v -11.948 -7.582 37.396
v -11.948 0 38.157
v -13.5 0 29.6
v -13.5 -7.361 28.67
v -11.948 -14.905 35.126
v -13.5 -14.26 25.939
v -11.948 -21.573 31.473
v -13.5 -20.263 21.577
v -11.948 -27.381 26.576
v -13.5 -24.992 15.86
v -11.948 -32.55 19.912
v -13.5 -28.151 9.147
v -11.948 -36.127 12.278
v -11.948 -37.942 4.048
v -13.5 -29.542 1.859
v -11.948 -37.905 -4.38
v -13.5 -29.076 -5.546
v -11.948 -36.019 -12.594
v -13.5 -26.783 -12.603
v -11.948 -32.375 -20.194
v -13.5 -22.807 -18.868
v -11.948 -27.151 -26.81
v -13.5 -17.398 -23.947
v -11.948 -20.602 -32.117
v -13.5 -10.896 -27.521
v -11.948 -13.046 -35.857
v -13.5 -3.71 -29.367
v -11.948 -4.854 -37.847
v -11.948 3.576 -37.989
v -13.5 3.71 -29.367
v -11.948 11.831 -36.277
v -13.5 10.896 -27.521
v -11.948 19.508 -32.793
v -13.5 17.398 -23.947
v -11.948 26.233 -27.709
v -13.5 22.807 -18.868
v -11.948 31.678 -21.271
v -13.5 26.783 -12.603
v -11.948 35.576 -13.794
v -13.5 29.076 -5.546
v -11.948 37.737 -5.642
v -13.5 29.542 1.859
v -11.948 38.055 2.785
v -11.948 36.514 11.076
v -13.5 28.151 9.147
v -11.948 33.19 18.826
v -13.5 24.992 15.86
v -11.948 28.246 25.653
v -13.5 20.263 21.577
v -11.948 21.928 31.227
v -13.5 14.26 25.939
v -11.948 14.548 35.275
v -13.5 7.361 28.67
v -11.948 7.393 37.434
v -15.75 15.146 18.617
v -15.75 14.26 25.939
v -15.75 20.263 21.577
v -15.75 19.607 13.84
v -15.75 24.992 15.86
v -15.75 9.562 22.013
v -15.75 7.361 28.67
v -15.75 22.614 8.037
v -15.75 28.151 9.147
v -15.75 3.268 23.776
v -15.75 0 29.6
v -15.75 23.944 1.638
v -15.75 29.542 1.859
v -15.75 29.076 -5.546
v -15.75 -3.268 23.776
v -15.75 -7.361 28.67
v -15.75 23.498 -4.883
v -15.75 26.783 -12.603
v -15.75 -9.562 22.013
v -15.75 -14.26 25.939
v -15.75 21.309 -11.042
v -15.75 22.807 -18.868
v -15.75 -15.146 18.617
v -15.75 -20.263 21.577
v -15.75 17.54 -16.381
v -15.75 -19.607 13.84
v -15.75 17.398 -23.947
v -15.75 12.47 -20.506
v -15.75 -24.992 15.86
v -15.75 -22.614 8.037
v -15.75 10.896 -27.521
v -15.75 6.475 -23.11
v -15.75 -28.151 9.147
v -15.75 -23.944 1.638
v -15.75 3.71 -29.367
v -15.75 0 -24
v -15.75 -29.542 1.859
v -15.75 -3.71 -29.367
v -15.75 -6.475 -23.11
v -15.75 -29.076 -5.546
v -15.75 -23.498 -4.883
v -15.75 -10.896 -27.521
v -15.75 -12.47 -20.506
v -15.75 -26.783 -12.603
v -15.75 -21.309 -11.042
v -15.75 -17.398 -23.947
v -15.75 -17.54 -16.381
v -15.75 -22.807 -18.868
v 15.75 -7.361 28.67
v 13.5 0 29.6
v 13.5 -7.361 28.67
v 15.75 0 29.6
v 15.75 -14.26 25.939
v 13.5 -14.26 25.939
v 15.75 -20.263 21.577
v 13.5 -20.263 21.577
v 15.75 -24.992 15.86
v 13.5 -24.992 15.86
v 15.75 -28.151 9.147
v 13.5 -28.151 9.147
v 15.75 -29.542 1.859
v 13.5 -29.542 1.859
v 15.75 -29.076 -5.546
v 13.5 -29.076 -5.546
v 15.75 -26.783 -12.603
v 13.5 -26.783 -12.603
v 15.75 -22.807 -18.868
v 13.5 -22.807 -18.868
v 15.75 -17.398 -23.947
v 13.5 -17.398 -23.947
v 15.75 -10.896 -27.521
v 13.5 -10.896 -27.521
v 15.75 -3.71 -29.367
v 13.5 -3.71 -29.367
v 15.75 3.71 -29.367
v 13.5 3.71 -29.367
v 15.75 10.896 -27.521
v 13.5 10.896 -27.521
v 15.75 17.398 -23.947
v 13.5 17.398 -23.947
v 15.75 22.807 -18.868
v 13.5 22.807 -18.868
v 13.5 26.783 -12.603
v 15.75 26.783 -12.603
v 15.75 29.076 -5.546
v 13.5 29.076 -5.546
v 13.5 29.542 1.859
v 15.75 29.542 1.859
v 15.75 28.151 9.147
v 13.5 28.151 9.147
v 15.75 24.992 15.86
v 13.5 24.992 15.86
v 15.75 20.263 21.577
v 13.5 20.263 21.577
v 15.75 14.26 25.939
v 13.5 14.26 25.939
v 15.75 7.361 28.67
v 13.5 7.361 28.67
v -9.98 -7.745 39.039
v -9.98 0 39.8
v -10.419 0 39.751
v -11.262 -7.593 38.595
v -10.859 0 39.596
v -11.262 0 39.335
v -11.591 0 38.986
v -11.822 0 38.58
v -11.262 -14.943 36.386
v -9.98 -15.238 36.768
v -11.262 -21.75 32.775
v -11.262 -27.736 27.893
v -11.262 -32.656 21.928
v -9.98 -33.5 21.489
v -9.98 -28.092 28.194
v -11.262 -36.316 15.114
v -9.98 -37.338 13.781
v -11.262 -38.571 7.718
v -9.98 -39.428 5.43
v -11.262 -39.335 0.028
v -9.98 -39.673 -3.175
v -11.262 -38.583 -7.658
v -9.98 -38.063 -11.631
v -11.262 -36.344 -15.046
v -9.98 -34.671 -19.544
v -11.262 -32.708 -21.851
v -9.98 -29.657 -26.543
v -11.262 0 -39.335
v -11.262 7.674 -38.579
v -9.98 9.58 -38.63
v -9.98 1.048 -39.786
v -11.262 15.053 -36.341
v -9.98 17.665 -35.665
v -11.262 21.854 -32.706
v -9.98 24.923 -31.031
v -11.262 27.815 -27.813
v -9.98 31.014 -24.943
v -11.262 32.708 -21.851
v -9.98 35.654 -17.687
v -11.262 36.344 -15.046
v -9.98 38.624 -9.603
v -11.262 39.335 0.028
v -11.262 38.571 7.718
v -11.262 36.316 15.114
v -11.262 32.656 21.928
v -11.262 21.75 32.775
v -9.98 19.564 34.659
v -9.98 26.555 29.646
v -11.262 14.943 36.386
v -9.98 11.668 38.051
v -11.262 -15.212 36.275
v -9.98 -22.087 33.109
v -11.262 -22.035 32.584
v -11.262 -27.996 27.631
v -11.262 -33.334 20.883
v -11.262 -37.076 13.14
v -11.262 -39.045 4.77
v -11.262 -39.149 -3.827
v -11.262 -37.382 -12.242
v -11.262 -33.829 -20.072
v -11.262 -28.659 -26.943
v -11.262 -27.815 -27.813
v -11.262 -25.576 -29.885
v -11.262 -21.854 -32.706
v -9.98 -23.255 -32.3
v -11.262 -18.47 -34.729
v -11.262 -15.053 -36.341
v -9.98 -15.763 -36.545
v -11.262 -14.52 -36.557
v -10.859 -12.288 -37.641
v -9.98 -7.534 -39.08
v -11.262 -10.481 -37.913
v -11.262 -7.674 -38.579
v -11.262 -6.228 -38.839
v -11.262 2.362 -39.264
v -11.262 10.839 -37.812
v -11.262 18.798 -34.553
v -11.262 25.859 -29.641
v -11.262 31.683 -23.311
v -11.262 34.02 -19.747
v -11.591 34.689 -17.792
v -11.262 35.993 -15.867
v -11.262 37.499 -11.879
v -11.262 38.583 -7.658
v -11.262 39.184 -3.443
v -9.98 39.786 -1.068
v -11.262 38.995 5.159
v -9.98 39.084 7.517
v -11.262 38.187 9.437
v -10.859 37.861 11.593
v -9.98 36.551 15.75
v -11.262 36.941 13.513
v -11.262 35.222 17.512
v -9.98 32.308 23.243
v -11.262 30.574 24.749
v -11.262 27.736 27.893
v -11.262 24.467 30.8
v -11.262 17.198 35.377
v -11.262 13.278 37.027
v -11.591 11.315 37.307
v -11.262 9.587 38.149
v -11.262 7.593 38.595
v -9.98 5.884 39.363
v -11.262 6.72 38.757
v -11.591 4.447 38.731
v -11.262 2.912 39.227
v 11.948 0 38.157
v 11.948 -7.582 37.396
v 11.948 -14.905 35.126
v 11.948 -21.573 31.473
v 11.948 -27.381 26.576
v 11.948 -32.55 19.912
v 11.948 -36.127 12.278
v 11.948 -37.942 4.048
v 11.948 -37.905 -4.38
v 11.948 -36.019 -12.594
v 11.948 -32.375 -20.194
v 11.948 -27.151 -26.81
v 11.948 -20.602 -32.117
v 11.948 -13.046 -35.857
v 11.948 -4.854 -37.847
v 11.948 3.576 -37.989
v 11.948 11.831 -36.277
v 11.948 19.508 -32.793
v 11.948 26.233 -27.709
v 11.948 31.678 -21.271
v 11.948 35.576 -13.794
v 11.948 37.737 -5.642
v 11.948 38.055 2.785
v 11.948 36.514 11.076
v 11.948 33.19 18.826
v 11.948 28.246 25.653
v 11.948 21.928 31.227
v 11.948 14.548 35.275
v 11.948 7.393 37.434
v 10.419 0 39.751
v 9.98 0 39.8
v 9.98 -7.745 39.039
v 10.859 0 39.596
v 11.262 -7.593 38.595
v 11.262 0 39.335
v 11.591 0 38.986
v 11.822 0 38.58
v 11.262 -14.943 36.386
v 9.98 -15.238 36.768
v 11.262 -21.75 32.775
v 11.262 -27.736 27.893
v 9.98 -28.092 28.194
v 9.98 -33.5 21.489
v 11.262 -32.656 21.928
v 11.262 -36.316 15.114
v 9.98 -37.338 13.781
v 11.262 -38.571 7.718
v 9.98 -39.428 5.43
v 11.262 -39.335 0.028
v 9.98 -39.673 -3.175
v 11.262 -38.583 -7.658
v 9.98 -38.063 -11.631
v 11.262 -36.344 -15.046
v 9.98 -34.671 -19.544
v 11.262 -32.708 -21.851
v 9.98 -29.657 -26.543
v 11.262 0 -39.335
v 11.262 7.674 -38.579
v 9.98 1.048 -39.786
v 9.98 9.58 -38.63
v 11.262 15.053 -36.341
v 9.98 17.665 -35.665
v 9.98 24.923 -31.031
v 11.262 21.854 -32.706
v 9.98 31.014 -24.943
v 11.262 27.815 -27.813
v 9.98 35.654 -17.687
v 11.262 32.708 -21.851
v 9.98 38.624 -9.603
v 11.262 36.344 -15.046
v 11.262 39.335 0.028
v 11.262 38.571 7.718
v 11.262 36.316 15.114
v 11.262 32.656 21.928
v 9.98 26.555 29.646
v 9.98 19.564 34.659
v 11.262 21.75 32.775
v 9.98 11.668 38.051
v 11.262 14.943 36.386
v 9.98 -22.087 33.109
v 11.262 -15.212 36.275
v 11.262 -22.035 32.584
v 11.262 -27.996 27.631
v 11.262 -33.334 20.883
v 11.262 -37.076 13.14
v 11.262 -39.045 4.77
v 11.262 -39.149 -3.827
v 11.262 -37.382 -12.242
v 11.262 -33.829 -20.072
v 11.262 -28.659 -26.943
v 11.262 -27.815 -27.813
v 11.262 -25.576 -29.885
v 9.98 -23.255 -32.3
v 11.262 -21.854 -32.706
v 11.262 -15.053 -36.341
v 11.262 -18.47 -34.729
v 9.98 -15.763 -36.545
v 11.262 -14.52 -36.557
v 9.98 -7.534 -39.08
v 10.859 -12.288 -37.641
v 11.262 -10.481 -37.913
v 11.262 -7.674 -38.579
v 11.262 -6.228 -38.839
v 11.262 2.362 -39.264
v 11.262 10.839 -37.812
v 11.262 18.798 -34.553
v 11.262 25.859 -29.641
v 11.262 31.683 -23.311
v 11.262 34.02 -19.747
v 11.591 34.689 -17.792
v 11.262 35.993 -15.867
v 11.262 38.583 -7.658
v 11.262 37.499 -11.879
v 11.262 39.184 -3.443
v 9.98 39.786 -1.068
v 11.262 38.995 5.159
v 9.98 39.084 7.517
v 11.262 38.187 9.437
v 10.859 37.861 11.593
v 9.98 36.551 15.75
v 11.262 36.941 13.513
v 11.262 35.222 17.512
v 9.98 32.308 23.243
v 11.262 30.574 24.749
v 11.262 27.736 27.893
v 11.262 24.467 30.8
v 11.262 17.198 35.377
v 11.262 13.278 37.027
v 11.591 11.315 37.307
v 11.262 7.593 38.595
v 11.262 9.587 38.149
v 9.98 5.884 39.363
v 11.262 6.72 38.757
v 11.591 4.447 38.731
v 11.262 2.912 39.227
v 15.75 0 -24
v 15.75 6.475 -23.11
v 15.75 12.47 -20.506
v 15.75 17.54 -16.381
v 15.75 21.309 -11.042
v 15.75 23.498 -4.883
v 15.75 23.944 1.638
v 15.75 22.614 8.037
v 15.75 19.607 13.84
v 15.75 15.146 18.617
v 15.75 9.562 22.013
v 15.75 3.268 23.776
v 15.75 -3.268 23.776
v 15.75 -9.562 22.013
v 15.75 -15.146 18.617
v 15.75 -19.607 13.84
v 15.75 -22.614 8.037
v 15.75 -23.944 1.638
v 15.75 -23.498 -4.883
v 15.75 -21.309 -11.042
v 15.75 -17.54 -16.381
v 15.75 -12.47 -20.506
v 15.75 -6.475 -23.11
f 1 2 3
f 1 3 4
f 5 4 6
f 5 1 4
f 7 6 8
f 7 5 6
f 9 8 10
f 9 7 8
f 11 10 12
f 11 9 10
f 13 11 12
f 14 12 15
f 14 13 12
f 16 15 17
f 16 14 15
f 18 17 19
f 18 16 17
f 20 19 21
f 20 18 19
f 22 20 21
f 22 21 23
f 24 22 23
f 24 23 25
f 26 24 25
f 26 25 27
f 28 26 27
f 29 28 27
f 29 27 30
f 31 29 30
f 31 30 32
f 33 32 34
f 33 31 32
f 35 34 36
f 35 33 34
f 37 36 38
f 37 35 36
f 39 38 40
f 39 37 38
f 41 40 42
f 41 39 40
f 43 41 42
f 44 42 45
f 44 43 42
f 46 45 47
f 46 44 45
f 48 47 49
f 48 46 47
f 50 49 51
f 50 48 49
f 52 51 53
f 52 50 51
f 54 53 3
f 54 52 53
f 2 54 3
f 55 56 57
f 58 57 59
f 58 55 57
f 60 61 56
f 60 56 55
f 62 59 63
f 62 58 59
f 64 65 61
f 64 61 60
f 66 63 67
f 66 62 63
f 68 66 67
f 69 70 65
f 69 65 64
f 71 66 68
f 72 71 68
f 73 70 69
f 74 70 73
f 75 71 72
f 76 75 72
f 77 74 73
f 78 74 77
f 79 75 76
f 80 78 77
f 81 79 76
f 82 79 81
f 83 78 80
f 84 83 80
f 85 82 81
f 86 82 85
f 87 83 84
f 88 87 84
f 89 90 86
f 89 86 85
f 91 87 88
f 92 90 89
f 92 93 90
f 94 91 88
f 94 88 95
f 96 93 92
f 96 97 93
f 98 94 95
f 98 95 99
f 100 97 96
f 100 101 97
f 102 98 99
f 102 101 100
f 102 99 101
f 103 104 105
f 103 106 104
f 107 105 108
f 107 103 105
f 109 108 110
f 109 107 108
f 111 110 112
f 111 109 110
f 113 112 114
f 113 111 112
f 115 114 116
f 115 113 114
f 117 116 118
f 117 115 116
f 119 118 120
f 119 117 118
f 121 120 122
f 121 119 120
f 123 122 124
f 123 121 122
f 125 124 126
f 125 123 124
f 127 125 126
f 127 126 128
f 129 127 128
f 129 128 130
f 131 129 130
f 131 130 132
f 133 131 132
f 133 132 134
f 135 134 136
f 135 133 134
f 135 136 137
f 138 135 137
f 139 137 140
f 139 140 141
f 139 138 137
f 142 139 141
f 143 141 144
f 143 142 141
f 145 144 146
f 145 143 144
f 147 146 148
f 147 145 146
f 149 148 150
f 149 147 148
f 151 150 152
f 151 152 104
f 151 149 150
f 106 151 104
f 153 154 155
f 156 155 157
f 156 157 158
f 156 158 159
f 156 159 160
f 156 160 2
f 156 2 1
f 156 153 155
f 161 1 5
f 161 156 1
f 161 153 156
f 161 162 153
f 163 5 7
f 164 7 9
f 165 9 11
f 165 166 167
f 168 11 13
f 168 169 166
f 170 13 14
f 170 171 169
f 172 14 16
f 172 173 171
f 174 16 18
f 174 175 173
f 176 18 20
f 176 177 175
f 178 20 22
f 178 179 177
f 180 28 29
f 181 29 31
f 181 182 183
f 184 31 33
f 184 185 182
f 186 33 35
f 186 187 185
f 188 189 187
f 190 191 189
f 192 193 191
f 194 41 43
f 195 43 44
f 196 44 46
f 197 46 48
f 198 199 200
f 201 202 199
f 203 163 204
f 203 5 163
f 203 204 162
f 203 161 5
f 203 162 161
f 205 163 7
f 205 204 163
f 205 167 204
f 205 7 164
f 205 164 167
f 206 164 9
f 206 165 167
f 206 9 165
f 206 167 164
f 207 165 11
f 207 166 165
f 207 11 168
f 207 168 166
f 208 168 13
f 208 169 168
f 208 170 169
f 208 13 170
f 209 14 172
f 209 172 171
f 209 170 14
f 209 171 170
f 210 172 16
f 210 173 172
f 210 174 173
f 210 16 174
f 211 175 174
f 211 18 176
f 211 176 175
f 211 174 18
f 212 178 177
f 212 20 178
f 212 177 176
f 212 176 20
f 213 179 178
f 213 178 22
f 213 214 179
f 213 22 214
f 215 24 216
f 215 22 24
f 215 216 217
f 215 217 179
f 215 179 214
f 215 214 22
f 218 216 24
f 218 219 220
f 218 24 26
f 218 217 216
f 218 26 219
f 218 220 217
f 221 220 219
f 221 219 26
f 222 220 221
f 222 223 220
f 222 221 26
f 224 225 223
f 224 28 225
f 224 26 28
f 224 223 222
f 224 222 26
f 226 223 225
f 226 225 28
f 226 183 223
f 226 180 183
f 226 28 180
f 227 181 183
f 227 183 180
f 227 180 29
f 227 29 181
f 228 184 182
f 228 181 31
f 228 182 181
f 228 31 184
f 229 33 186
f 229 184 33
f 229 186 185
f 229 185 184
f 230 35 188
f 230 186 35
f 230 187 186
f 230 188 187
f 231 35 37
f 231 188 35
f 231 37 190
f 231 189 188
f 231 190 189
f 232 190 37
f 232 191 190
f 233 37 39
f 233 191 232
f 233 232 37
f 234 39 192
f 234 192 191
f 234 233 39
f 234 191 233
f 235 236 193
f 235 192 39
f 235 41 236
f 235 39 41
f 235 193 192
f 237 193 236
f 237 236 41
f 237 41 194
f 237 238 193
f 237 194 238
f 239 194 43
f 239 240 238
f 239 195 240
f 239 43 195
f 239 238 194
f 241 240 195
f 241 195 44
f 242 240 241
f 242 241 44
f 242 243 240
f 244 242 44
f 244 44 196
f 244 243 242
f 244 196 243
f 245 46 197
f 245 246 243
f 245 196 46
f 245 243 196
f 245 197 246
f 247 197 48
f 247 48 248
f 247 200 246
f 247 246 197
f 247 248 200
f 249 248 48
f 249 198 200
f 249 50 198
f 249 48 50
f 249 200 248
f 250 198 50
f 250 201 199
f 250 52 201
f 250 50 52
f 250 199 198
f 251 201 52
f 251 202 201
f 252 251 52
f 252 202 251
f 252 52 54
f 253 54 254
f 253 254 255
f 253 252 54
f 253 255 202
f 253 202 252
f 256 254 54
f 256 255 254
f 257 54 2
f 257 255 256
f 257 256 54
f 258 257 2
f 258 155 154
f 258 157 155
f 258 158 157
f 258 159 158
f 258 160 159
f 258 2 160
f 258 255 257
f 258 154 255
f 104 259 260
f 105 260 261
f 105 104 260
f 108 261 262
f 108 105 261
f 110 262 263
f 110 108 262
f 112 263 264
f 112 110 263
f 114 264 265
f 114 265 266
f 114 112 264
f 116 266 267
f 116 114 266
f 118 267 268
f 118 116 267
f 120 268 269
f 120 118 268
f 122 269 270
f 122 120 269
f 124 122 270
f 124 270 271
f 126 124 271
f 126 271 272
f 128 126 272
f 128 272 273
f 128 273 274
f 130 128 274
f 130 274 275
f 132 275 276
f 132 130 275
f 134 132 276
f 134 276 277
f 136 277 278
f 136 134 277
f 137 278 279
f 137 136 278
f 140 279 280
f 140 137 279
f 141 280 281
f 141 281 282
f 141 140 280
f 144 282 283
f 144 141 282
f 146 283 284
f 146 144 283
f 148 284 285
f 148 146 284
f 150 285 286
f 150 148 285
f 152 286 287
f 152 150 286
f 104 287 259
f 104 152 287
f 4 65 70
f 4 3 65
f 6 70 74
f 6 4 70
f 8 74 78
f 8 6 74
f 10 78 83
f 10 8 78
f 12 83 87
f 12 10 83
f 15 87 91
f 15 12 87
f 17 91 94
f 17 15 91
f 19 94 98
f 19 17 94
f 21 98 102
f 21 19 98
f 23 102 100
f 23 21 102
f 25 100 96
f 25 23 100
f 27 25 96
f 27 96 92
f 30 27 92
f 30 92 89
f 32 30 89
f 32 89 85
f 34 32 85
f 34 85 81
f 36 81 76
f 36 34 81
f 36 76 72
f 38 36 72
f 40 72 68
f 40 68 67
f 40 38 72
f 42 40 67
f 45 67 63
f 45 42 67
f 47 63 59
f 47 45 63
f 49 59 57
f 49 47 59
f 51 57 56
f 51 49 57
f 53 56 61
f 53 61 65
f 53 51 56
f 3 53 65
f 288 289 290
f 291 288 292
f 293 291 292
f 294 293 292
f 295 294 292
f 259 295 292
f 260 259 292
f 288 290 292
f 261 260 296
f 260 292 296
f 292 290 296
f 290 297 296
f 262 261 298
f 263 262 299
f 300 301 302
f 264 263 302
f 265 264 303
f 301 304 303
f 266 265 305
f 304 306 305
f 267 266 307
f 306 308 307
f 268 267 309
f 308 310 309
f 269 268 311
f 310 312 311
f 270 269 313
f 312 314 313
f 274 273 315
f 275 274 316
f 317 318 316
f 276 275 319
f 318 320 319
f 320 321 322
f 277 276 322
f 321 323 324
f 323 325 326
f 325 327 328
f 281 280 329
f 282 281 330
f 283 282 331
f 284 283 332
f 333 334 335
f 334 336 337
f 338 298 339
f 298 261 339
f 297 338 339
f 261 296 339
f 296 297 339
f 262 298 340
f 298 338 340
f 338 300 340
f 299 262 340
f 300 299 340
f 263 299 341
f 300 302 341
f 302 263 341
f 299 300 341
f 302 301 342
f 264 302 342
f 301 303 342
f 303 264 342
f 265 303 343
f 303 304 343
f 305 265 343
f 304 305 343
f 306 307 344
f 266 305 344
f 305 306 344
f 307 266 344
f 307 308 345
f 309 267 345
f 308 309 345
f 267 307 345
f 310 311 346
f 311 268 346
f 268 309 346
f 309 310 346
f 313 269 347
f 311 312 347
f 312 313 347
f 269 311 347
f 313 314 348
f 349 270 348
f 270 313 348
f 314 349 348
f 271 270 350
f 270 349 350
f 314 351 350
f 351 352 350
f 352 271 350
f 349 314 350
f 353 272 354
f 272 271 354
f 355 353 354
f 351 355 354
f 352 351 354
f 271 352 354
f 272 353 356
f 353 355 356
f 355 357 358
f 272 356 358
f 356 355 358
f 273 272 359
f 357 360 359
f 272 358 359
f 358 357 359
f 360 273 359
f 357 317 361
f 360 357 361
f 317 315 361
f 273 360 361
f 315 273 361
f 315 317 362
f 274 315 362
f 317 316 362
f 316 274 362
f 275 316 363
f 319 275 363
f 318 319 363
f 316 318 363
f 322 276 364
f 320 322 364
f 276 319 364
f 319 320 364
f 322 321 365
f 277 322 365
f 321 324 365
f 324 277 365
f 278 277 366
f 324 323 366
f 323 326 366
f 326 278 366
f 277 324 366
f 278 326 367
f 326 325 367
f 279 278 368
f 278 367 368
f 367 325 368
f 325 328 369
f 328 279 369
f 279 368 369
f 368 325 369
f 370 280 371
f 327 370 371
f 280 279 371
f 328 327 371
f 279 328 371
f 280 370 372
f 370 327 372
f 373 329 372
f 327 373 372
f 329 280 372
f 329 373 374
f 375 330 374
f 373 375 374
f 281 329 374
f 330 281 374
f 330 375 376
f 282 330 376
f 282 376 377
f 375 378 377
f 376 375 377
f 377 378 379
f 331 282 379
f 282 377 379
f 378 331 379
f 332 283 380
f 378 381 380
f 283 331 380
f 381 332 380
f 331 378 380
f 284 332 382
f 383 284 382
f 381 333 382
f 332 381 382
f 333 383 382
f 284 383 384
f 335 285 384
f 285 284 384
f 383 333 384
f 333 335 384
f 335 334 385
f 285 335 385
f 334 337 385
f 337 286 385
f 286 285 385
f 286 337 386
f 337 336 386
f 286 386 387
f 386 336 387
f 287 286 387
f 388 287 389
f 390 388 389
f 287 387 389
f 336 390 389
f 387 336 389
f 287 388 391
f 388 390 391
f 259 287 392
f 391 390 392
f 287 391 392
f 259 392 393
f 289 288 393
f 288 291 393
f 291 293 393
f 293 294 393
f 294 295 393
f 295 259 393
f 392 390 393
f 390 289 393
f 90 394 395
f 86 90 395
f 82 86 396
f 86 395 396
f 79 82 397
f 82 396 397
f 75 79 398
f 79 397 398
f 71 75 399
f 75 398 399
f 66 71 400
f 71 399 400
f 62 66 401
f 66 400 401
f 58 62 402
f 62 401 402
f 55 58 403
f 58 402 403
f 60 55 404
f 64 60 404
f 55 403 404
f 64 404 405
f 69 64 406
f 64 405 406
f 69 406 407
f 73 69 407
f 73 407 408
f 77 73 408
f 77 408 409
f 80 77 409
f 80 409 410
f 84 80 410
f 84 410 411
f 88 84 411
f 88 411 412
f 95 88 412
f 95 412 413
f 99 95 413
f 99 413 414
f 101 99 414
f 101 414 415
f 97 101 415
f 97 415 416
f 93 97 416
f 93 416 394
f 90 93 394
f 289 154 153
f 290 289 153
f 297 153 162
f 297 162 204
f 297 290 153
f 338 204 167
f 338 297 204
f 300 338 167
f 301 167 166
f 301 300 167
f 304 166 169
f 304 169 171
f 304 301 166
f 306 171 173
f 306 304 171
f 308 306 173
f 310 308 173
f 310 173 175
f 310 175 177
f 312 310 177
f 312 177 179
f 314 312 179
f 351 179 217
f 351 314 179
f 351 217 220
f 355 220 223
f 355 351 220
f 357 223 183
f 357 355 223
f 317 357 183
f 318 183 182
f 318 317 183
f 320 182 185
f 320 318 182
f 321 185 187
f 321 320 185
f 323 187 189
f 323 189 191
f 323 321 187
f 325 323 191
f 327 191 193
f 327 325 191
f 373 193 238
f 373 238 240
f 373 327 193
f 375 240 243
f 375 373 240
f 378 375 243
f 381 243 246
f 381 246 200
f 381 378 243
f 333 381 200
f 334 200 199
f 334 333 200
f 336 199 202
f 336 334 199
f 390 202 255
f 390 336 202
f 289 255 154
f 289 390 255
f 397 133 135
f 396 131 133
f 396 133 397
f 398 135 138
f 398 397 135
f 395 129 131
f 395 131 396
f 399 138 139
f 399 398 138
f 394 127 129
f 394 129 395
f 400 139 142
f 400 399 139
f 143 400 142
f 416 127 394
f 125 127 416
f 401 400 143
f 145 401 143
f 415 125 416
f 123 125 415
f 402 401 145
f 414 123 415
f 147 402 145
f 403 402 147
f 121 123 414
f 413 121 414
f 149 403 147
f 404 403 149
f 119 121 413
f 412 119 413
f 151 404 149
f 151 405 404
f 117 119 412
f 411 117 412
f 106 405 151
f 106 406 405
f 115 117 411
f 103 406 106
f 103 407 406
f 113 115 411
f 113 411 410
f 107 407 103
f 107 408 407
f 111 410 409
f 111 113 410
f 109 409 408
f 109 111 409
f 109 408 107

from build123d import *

# Parameters (mm, degrees)
FILLET1_R          = 2
SKETCH2_R          = 24
CUT_EXTRUDE1_DEPTH = 70.225501822


with BuildPart() as part:
    # Sketch1 → Revolve1 (revolve)
    with BuildSketch(Plane.XY, mode=Mode.PRIVATE) as revolve1_sk:
        Polygon((-11.65, -39.8), (11.65, -39.8), (13.5, -29.6), (15.75, -29.6), (15.75, -23.6), (4.25, -20.75), (4.25, -17), (20.15, -15.75), (20.15, -10.05), (-20.15, -10.05), (-20.15, -15.75), (-4.25, -17), (-4.25, -20.75), (-15.75, -23.6), (-15.75, -29.6), (-13.5, -29.6), align=None)
    revolve(revolve1_sk.sketch.rotate(Axis((0, 0, 0), (1, 0, 0)), 270), axis=Axis((0, 0, 0), (1, 0, 0)))

    # Fillet1
    fillet1_edges = [part.edges().sort_by_distance(p)[0] for p in [
        (11.65, 0, -39.8),
        (-11.65, 0, -39.8),
        (-4.25, 0, -20.75),
        (-4.25, 0, -17),
        (-20.15, 0, -15.75),
        (20.15, 0, -15.75),
        (4.25, 0, -17),
        (4.25, 0, -20.75),
    ]]
    fillet(fillet1_edges, radius=FILLET1_R)

    # Sketch2 → Cut-Extrude1 (cut, through all)
    with BuildSketch(Plane(origin=(20.15, 0, 0), x_dir=(0, 0, -1), z_dir=(1, 0, 0))):
        Circle(SKETCH2_R)
    extrude(amount=-CUT_EXTRUDE1_DEPTH, mode=Mode.SUBTRACT)


solid = part.part
